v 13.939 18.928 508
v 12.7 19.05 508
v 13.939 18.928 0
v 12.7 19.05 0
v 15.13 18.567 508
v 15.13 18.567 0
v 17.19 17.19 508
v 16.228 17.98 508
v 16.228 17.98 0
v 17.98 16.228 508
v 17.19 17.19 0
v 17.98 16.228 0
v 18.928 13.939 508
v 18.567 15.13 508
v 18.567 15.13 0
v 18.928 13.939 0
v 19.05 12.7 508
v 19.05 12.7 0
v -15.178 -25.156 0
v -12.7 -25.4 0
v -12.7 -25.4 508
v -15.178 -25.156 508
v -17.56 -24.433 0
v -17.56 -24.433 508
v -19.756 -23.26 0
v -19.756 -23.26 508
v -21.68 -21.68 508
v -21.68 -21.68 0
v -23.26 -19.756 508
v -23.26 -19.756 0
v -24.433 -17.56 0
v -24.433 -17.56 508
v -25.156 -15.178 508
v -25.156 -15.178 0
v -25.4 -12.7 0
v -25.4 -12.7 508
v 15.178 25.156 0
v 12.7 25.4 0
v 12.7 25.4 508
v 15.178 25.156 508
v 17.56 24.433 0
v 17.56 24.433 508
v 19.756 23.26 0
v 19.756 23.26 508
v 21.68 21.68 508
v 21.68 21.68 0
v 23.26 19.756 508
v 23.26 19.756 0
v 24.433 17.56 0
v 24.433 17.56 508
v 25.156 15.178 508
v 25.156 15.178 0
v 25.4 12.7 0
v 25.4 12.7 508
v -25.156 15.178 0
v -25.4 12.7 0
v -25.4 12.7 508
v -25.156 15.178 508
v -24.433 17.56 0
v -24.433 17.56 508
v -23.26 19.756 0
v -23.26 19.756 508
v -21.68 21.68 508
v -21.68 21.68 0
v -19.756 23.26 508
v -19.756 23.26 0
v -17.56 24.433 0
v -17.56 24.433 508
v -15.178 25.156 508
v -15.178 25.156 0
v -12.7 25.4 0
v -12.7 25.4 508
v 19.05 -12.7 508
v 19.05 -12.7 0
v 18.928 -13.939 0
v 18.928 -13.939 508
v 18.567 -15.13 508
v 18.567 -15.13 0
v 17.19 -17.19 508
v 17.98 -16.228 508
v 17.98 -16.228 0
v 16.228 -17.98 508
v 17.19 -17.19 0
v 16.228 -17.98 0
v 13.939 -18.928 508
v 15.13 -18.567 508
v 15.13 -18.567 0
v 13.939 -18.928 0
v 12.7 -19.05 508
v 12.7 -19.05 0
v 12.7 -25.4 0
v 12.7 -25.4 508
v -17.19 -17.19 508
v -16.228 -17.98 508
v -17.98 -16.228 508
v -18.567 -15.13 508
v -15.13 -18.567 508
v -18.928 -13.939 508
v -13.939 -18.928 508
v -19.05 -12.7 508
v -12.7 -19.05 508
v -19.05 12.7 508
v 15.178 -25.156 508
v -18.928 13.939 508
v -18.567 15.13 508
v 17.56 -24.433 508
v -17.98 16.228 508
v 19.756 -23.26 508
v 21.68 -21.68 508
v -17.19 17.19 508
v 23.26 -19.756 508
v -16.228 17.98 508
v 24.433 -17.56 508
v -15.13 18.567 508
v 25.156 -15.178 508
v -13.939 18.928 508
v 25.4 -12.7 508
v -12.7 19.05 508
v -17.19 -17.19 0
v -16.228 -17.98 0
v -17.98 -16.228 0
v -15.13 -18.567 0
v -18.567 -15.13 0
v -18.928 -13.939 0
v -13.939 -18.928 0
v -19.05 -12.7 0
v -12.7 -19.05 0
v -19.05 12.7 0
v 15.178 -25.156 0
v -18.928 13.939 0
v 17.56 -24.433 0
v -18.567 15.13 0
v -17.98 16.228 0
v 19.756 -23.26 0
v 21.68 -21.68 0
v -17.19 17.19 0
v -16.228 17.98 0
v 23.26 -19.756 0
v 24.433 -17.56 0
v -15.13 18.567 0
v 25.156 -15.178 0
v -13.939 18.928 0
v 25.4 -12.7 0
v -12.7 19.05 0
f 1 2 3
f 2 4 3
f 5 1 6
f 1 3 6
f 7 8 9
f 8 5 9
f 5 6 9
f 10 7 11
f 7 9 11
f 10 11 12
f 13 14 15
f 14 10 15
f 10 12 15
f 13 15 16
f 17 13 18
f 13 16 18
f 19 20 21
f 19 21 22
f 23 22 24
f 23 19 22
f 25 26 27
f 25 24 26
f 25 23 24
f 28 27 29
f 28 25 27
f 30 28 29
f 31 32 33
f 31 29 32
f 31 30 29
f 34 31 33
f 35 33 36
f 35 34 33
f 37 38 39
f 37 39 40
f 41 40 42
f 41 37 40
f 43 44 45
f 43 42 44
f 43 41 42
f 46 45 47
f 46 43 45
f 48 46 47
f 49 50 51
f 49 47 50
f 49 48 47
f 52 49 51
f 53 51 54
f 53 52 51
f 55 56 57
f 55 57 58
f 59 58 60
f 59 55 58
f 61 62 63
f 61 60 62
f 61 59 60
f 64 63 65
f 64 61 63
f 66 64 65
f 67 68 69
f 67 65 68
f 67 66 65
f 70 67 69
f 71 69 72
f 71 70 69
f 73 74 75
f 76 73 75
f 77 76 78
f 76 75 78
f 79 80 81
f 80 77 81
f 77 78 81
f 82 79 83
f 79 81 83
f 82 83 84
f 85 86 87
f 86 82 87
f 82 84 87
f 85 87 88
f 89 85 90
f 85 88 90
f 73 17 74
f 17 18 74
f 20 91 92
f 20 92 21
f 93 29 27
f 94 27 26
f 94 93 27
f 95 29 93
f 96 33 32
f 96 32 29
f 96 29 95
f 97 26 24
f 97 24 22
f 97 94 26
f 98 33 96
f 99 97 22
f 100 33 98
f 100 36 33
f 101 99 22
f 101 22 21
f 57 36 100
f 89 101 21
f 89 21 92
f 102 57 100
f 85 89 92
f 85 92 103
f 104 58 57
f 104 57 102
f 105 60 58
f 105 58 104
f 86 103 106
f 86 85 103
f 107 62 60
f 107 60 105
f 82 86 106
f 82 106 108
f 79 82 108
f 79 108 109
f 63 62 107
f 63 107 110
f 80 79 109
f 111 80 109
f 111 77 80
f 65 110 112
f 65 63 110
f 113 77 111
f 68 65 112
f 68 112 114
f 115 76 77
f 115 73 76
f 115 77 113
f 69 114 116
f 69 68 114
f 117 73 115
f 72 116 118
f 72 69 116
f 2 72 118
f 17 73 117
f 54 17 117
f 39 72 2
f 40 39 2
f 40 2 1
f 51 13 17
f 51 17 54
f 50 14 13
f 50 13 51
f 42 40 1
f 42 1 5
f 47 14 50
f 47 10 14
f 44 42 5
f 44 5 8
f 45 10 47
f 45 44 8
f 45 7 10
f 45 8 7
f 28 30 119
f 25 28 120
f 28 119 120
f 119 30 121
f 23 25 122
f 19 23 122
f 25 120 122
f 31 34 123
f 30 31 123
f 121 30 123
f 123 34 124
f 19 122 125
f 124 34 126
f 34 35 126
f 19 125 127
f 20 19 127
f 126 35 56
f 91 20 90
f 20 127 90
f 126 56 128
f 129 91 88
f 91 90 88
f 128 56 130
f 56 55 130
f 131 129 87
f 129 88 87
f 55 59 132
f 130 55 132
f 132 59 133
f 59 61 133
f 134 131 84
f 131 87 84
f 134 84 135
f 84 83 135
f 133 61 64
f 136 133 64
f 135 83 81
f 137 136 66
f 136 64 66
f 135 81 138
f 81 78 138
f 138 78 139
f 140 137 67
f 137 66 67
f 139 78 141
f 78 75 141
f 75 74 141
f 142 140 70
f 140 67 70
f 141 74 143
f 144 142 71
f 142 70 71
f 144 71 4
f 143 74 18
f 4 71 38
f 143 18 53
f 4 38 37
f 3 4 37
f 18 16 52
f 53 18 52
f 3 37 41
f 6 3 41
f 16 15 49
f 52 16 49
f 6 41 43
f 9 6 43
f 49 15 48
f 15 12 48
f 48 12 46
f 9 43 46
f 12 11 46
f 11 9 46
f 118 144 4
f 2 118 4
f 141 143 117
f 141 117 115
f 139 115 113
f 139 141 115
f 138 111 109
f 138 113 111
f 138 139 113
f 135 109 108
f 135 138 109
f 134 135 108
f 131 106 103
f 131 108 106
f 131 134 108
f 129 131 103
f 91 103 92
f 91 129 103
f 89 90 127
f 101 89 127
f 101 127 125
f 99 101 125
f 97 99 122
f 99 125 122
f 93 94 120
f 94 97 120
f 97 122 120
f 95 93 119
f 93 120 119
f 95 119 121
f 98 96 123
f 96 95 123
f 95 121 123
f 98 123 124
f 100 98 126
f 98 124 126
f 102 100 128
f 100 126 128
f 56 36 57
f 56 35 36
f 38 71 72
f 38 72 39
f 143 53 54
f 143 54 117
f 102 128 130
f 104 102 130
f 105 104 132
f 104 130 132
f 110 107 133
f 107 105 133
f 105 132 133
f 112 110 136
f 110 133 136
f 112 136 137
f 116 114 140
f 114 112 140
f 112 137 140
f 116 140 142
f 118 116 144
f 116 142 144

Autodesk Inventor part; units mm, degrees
ref_plane "Start Plane" through (0, 0, 0) normal (0, 0, 1) x (1, 0, 0)
ref_plane "End Plane" through (0, 0, 508) normal (0, 0, 1) x (1, 0, 0)
sketch "Sketch" plane through (0, 0, 0) normal (0, 0, 1) x (1, 0, 0)
  line L0 (-25.4, -12.7) -> (-25.4, 12.7)
  line L1 (-12.7, 25.4) -> (12.7, 25.4)
  line L2 (25.4, 12.7) -> (25.4, -12.7)
  line L3 (12.7, -25.4) -> (-12.7, -25.4)
  arc A0 (-25.4, -12.7) -> (-12.7, -25.4) centre (-12.7, -12.7) ccw
  arc A1 (-12.7, 25.4) -> (-25.4, 12.7) centre (-12.7, 12.7) ccw
  arc A2 (25.4, 12.7) -> (12.7, 25.4) centre (12.7, 12.7) ccw
  arc A3 (12.7, -25.4) -> (25.4, -12.7) centre (12.7, -12.7) ccw
  arc A4 (-12.7, 19.05) -> (-19.05, 12.7) centre (-12.7, 12.7) ccw
  line L4 (-12.7, 19.05) -> (12.7, 19.05)
  arc A5 (19.05, 12.7) -> (12.7, 19.05) centre (12.7, 12.7) ccw
  line L5 (19.05, 12.7) -> (19.05, -12.7)
  arc A6 (12.7, -19.05) -> (19.05, -12.7) centre (12.7, -12.7) ccw
  line L6 (12.7, -19.05) -> (-12.7, -19.05)
  arc A7 (-19.05, -12.7) -> (-12.7, -19.05) centre (-12.7, -12.7) ccw
  line L7 (-19.05, -12.7) -> (-19.05, 12.7)
  line L8 (0, 39.2424) -> (0, -39.2424) construction
  line L9 (-39.2424, 0) -> (39.2424, 0) construction
  dimension "d10" = 50.8
  dimension "d11" = 50.8
  dimension "d12" = 6.35
  dimension "d15" = 25.4
  dimension "d16" = 25.4
  dimension "d17" = 12.7
extrude "Body" add sketch "Sketch" along normal up to surface (508 mm away) from surface at 0
sketch "Sketch3" plane through (0, 0, 0) normal (0, 0, 1) x (1, 0, 0)
  line L0 (0, 0) -> (10, 0)
ref_plane "Work Plane3" through (0, 0, 0) normal (0, -1, 0) x (1, 0, 0)
ref_plane "Work Plane4" through (0, -482.6, 0) normal (0, 0, -1) x (-1, 0, 0)
split "Split1" plane through (0, -482.6, 0) removes the side toward (0, 0, -1)
ref_plane "Work Plane5" through (0, -482.6, 508) normal (0, 0, 1) x (1, 0, 0)
split "Split2" plane through (0, -482.6, 508) removes the side toward (0, 0, 1)
ref_plane "Work Plane6" through (25.4, 0, 0) normal (0, 0, -1) x (-1, 0, 0)
split "Split3" plane through (25.4, 0, 0) removes the side toward (0, 0, -1)
ref_plane "Work Plane7" through (25.4, 0, 508) normal (0, 0, 1) x (1, 0, 0)
split "Split4" plane through (25.4, 0, 508) removes the side toward (0, 0, 1)
sketch "Sketch4" plane through (0, 0, 0) normal (0, -1, 0) x (1, 0, 0)
  line L0 (-2, 0) -> (12, 0) projected
  line L1 (-2, 508) -> (12, 508) projected
  dimension "d19" = 508
equation "\"d10\" = G_H"
equation "\"d11\" = G_W"
equation "\"d12\" = G_T"
equation "\"d15\" = 0.5 * d10"
equation "\"d16\" = 0.5 * d11"
equation "\"d17\" = G_IR"
equation "\"d3\" = G_L"
equation "\"G_W\" = 50.8"
equation "\"G_H\" = 50.8"
equation "\"G_T\" = 6.35"
equation "\"G_IR\" = 12.7"
equation "\"G_L\" = d19"
equation "\"G_OFFSET_START\" = 0"
equation "\"G_OFFSET_END\" = 0"
equation "\"d14\" = G_OFFSET_END + B_L"
equation "\"B_L\" = 508"
properties part number "AISC - 2 x 2 x 1/4 - 20" material "Steel, Mild"
